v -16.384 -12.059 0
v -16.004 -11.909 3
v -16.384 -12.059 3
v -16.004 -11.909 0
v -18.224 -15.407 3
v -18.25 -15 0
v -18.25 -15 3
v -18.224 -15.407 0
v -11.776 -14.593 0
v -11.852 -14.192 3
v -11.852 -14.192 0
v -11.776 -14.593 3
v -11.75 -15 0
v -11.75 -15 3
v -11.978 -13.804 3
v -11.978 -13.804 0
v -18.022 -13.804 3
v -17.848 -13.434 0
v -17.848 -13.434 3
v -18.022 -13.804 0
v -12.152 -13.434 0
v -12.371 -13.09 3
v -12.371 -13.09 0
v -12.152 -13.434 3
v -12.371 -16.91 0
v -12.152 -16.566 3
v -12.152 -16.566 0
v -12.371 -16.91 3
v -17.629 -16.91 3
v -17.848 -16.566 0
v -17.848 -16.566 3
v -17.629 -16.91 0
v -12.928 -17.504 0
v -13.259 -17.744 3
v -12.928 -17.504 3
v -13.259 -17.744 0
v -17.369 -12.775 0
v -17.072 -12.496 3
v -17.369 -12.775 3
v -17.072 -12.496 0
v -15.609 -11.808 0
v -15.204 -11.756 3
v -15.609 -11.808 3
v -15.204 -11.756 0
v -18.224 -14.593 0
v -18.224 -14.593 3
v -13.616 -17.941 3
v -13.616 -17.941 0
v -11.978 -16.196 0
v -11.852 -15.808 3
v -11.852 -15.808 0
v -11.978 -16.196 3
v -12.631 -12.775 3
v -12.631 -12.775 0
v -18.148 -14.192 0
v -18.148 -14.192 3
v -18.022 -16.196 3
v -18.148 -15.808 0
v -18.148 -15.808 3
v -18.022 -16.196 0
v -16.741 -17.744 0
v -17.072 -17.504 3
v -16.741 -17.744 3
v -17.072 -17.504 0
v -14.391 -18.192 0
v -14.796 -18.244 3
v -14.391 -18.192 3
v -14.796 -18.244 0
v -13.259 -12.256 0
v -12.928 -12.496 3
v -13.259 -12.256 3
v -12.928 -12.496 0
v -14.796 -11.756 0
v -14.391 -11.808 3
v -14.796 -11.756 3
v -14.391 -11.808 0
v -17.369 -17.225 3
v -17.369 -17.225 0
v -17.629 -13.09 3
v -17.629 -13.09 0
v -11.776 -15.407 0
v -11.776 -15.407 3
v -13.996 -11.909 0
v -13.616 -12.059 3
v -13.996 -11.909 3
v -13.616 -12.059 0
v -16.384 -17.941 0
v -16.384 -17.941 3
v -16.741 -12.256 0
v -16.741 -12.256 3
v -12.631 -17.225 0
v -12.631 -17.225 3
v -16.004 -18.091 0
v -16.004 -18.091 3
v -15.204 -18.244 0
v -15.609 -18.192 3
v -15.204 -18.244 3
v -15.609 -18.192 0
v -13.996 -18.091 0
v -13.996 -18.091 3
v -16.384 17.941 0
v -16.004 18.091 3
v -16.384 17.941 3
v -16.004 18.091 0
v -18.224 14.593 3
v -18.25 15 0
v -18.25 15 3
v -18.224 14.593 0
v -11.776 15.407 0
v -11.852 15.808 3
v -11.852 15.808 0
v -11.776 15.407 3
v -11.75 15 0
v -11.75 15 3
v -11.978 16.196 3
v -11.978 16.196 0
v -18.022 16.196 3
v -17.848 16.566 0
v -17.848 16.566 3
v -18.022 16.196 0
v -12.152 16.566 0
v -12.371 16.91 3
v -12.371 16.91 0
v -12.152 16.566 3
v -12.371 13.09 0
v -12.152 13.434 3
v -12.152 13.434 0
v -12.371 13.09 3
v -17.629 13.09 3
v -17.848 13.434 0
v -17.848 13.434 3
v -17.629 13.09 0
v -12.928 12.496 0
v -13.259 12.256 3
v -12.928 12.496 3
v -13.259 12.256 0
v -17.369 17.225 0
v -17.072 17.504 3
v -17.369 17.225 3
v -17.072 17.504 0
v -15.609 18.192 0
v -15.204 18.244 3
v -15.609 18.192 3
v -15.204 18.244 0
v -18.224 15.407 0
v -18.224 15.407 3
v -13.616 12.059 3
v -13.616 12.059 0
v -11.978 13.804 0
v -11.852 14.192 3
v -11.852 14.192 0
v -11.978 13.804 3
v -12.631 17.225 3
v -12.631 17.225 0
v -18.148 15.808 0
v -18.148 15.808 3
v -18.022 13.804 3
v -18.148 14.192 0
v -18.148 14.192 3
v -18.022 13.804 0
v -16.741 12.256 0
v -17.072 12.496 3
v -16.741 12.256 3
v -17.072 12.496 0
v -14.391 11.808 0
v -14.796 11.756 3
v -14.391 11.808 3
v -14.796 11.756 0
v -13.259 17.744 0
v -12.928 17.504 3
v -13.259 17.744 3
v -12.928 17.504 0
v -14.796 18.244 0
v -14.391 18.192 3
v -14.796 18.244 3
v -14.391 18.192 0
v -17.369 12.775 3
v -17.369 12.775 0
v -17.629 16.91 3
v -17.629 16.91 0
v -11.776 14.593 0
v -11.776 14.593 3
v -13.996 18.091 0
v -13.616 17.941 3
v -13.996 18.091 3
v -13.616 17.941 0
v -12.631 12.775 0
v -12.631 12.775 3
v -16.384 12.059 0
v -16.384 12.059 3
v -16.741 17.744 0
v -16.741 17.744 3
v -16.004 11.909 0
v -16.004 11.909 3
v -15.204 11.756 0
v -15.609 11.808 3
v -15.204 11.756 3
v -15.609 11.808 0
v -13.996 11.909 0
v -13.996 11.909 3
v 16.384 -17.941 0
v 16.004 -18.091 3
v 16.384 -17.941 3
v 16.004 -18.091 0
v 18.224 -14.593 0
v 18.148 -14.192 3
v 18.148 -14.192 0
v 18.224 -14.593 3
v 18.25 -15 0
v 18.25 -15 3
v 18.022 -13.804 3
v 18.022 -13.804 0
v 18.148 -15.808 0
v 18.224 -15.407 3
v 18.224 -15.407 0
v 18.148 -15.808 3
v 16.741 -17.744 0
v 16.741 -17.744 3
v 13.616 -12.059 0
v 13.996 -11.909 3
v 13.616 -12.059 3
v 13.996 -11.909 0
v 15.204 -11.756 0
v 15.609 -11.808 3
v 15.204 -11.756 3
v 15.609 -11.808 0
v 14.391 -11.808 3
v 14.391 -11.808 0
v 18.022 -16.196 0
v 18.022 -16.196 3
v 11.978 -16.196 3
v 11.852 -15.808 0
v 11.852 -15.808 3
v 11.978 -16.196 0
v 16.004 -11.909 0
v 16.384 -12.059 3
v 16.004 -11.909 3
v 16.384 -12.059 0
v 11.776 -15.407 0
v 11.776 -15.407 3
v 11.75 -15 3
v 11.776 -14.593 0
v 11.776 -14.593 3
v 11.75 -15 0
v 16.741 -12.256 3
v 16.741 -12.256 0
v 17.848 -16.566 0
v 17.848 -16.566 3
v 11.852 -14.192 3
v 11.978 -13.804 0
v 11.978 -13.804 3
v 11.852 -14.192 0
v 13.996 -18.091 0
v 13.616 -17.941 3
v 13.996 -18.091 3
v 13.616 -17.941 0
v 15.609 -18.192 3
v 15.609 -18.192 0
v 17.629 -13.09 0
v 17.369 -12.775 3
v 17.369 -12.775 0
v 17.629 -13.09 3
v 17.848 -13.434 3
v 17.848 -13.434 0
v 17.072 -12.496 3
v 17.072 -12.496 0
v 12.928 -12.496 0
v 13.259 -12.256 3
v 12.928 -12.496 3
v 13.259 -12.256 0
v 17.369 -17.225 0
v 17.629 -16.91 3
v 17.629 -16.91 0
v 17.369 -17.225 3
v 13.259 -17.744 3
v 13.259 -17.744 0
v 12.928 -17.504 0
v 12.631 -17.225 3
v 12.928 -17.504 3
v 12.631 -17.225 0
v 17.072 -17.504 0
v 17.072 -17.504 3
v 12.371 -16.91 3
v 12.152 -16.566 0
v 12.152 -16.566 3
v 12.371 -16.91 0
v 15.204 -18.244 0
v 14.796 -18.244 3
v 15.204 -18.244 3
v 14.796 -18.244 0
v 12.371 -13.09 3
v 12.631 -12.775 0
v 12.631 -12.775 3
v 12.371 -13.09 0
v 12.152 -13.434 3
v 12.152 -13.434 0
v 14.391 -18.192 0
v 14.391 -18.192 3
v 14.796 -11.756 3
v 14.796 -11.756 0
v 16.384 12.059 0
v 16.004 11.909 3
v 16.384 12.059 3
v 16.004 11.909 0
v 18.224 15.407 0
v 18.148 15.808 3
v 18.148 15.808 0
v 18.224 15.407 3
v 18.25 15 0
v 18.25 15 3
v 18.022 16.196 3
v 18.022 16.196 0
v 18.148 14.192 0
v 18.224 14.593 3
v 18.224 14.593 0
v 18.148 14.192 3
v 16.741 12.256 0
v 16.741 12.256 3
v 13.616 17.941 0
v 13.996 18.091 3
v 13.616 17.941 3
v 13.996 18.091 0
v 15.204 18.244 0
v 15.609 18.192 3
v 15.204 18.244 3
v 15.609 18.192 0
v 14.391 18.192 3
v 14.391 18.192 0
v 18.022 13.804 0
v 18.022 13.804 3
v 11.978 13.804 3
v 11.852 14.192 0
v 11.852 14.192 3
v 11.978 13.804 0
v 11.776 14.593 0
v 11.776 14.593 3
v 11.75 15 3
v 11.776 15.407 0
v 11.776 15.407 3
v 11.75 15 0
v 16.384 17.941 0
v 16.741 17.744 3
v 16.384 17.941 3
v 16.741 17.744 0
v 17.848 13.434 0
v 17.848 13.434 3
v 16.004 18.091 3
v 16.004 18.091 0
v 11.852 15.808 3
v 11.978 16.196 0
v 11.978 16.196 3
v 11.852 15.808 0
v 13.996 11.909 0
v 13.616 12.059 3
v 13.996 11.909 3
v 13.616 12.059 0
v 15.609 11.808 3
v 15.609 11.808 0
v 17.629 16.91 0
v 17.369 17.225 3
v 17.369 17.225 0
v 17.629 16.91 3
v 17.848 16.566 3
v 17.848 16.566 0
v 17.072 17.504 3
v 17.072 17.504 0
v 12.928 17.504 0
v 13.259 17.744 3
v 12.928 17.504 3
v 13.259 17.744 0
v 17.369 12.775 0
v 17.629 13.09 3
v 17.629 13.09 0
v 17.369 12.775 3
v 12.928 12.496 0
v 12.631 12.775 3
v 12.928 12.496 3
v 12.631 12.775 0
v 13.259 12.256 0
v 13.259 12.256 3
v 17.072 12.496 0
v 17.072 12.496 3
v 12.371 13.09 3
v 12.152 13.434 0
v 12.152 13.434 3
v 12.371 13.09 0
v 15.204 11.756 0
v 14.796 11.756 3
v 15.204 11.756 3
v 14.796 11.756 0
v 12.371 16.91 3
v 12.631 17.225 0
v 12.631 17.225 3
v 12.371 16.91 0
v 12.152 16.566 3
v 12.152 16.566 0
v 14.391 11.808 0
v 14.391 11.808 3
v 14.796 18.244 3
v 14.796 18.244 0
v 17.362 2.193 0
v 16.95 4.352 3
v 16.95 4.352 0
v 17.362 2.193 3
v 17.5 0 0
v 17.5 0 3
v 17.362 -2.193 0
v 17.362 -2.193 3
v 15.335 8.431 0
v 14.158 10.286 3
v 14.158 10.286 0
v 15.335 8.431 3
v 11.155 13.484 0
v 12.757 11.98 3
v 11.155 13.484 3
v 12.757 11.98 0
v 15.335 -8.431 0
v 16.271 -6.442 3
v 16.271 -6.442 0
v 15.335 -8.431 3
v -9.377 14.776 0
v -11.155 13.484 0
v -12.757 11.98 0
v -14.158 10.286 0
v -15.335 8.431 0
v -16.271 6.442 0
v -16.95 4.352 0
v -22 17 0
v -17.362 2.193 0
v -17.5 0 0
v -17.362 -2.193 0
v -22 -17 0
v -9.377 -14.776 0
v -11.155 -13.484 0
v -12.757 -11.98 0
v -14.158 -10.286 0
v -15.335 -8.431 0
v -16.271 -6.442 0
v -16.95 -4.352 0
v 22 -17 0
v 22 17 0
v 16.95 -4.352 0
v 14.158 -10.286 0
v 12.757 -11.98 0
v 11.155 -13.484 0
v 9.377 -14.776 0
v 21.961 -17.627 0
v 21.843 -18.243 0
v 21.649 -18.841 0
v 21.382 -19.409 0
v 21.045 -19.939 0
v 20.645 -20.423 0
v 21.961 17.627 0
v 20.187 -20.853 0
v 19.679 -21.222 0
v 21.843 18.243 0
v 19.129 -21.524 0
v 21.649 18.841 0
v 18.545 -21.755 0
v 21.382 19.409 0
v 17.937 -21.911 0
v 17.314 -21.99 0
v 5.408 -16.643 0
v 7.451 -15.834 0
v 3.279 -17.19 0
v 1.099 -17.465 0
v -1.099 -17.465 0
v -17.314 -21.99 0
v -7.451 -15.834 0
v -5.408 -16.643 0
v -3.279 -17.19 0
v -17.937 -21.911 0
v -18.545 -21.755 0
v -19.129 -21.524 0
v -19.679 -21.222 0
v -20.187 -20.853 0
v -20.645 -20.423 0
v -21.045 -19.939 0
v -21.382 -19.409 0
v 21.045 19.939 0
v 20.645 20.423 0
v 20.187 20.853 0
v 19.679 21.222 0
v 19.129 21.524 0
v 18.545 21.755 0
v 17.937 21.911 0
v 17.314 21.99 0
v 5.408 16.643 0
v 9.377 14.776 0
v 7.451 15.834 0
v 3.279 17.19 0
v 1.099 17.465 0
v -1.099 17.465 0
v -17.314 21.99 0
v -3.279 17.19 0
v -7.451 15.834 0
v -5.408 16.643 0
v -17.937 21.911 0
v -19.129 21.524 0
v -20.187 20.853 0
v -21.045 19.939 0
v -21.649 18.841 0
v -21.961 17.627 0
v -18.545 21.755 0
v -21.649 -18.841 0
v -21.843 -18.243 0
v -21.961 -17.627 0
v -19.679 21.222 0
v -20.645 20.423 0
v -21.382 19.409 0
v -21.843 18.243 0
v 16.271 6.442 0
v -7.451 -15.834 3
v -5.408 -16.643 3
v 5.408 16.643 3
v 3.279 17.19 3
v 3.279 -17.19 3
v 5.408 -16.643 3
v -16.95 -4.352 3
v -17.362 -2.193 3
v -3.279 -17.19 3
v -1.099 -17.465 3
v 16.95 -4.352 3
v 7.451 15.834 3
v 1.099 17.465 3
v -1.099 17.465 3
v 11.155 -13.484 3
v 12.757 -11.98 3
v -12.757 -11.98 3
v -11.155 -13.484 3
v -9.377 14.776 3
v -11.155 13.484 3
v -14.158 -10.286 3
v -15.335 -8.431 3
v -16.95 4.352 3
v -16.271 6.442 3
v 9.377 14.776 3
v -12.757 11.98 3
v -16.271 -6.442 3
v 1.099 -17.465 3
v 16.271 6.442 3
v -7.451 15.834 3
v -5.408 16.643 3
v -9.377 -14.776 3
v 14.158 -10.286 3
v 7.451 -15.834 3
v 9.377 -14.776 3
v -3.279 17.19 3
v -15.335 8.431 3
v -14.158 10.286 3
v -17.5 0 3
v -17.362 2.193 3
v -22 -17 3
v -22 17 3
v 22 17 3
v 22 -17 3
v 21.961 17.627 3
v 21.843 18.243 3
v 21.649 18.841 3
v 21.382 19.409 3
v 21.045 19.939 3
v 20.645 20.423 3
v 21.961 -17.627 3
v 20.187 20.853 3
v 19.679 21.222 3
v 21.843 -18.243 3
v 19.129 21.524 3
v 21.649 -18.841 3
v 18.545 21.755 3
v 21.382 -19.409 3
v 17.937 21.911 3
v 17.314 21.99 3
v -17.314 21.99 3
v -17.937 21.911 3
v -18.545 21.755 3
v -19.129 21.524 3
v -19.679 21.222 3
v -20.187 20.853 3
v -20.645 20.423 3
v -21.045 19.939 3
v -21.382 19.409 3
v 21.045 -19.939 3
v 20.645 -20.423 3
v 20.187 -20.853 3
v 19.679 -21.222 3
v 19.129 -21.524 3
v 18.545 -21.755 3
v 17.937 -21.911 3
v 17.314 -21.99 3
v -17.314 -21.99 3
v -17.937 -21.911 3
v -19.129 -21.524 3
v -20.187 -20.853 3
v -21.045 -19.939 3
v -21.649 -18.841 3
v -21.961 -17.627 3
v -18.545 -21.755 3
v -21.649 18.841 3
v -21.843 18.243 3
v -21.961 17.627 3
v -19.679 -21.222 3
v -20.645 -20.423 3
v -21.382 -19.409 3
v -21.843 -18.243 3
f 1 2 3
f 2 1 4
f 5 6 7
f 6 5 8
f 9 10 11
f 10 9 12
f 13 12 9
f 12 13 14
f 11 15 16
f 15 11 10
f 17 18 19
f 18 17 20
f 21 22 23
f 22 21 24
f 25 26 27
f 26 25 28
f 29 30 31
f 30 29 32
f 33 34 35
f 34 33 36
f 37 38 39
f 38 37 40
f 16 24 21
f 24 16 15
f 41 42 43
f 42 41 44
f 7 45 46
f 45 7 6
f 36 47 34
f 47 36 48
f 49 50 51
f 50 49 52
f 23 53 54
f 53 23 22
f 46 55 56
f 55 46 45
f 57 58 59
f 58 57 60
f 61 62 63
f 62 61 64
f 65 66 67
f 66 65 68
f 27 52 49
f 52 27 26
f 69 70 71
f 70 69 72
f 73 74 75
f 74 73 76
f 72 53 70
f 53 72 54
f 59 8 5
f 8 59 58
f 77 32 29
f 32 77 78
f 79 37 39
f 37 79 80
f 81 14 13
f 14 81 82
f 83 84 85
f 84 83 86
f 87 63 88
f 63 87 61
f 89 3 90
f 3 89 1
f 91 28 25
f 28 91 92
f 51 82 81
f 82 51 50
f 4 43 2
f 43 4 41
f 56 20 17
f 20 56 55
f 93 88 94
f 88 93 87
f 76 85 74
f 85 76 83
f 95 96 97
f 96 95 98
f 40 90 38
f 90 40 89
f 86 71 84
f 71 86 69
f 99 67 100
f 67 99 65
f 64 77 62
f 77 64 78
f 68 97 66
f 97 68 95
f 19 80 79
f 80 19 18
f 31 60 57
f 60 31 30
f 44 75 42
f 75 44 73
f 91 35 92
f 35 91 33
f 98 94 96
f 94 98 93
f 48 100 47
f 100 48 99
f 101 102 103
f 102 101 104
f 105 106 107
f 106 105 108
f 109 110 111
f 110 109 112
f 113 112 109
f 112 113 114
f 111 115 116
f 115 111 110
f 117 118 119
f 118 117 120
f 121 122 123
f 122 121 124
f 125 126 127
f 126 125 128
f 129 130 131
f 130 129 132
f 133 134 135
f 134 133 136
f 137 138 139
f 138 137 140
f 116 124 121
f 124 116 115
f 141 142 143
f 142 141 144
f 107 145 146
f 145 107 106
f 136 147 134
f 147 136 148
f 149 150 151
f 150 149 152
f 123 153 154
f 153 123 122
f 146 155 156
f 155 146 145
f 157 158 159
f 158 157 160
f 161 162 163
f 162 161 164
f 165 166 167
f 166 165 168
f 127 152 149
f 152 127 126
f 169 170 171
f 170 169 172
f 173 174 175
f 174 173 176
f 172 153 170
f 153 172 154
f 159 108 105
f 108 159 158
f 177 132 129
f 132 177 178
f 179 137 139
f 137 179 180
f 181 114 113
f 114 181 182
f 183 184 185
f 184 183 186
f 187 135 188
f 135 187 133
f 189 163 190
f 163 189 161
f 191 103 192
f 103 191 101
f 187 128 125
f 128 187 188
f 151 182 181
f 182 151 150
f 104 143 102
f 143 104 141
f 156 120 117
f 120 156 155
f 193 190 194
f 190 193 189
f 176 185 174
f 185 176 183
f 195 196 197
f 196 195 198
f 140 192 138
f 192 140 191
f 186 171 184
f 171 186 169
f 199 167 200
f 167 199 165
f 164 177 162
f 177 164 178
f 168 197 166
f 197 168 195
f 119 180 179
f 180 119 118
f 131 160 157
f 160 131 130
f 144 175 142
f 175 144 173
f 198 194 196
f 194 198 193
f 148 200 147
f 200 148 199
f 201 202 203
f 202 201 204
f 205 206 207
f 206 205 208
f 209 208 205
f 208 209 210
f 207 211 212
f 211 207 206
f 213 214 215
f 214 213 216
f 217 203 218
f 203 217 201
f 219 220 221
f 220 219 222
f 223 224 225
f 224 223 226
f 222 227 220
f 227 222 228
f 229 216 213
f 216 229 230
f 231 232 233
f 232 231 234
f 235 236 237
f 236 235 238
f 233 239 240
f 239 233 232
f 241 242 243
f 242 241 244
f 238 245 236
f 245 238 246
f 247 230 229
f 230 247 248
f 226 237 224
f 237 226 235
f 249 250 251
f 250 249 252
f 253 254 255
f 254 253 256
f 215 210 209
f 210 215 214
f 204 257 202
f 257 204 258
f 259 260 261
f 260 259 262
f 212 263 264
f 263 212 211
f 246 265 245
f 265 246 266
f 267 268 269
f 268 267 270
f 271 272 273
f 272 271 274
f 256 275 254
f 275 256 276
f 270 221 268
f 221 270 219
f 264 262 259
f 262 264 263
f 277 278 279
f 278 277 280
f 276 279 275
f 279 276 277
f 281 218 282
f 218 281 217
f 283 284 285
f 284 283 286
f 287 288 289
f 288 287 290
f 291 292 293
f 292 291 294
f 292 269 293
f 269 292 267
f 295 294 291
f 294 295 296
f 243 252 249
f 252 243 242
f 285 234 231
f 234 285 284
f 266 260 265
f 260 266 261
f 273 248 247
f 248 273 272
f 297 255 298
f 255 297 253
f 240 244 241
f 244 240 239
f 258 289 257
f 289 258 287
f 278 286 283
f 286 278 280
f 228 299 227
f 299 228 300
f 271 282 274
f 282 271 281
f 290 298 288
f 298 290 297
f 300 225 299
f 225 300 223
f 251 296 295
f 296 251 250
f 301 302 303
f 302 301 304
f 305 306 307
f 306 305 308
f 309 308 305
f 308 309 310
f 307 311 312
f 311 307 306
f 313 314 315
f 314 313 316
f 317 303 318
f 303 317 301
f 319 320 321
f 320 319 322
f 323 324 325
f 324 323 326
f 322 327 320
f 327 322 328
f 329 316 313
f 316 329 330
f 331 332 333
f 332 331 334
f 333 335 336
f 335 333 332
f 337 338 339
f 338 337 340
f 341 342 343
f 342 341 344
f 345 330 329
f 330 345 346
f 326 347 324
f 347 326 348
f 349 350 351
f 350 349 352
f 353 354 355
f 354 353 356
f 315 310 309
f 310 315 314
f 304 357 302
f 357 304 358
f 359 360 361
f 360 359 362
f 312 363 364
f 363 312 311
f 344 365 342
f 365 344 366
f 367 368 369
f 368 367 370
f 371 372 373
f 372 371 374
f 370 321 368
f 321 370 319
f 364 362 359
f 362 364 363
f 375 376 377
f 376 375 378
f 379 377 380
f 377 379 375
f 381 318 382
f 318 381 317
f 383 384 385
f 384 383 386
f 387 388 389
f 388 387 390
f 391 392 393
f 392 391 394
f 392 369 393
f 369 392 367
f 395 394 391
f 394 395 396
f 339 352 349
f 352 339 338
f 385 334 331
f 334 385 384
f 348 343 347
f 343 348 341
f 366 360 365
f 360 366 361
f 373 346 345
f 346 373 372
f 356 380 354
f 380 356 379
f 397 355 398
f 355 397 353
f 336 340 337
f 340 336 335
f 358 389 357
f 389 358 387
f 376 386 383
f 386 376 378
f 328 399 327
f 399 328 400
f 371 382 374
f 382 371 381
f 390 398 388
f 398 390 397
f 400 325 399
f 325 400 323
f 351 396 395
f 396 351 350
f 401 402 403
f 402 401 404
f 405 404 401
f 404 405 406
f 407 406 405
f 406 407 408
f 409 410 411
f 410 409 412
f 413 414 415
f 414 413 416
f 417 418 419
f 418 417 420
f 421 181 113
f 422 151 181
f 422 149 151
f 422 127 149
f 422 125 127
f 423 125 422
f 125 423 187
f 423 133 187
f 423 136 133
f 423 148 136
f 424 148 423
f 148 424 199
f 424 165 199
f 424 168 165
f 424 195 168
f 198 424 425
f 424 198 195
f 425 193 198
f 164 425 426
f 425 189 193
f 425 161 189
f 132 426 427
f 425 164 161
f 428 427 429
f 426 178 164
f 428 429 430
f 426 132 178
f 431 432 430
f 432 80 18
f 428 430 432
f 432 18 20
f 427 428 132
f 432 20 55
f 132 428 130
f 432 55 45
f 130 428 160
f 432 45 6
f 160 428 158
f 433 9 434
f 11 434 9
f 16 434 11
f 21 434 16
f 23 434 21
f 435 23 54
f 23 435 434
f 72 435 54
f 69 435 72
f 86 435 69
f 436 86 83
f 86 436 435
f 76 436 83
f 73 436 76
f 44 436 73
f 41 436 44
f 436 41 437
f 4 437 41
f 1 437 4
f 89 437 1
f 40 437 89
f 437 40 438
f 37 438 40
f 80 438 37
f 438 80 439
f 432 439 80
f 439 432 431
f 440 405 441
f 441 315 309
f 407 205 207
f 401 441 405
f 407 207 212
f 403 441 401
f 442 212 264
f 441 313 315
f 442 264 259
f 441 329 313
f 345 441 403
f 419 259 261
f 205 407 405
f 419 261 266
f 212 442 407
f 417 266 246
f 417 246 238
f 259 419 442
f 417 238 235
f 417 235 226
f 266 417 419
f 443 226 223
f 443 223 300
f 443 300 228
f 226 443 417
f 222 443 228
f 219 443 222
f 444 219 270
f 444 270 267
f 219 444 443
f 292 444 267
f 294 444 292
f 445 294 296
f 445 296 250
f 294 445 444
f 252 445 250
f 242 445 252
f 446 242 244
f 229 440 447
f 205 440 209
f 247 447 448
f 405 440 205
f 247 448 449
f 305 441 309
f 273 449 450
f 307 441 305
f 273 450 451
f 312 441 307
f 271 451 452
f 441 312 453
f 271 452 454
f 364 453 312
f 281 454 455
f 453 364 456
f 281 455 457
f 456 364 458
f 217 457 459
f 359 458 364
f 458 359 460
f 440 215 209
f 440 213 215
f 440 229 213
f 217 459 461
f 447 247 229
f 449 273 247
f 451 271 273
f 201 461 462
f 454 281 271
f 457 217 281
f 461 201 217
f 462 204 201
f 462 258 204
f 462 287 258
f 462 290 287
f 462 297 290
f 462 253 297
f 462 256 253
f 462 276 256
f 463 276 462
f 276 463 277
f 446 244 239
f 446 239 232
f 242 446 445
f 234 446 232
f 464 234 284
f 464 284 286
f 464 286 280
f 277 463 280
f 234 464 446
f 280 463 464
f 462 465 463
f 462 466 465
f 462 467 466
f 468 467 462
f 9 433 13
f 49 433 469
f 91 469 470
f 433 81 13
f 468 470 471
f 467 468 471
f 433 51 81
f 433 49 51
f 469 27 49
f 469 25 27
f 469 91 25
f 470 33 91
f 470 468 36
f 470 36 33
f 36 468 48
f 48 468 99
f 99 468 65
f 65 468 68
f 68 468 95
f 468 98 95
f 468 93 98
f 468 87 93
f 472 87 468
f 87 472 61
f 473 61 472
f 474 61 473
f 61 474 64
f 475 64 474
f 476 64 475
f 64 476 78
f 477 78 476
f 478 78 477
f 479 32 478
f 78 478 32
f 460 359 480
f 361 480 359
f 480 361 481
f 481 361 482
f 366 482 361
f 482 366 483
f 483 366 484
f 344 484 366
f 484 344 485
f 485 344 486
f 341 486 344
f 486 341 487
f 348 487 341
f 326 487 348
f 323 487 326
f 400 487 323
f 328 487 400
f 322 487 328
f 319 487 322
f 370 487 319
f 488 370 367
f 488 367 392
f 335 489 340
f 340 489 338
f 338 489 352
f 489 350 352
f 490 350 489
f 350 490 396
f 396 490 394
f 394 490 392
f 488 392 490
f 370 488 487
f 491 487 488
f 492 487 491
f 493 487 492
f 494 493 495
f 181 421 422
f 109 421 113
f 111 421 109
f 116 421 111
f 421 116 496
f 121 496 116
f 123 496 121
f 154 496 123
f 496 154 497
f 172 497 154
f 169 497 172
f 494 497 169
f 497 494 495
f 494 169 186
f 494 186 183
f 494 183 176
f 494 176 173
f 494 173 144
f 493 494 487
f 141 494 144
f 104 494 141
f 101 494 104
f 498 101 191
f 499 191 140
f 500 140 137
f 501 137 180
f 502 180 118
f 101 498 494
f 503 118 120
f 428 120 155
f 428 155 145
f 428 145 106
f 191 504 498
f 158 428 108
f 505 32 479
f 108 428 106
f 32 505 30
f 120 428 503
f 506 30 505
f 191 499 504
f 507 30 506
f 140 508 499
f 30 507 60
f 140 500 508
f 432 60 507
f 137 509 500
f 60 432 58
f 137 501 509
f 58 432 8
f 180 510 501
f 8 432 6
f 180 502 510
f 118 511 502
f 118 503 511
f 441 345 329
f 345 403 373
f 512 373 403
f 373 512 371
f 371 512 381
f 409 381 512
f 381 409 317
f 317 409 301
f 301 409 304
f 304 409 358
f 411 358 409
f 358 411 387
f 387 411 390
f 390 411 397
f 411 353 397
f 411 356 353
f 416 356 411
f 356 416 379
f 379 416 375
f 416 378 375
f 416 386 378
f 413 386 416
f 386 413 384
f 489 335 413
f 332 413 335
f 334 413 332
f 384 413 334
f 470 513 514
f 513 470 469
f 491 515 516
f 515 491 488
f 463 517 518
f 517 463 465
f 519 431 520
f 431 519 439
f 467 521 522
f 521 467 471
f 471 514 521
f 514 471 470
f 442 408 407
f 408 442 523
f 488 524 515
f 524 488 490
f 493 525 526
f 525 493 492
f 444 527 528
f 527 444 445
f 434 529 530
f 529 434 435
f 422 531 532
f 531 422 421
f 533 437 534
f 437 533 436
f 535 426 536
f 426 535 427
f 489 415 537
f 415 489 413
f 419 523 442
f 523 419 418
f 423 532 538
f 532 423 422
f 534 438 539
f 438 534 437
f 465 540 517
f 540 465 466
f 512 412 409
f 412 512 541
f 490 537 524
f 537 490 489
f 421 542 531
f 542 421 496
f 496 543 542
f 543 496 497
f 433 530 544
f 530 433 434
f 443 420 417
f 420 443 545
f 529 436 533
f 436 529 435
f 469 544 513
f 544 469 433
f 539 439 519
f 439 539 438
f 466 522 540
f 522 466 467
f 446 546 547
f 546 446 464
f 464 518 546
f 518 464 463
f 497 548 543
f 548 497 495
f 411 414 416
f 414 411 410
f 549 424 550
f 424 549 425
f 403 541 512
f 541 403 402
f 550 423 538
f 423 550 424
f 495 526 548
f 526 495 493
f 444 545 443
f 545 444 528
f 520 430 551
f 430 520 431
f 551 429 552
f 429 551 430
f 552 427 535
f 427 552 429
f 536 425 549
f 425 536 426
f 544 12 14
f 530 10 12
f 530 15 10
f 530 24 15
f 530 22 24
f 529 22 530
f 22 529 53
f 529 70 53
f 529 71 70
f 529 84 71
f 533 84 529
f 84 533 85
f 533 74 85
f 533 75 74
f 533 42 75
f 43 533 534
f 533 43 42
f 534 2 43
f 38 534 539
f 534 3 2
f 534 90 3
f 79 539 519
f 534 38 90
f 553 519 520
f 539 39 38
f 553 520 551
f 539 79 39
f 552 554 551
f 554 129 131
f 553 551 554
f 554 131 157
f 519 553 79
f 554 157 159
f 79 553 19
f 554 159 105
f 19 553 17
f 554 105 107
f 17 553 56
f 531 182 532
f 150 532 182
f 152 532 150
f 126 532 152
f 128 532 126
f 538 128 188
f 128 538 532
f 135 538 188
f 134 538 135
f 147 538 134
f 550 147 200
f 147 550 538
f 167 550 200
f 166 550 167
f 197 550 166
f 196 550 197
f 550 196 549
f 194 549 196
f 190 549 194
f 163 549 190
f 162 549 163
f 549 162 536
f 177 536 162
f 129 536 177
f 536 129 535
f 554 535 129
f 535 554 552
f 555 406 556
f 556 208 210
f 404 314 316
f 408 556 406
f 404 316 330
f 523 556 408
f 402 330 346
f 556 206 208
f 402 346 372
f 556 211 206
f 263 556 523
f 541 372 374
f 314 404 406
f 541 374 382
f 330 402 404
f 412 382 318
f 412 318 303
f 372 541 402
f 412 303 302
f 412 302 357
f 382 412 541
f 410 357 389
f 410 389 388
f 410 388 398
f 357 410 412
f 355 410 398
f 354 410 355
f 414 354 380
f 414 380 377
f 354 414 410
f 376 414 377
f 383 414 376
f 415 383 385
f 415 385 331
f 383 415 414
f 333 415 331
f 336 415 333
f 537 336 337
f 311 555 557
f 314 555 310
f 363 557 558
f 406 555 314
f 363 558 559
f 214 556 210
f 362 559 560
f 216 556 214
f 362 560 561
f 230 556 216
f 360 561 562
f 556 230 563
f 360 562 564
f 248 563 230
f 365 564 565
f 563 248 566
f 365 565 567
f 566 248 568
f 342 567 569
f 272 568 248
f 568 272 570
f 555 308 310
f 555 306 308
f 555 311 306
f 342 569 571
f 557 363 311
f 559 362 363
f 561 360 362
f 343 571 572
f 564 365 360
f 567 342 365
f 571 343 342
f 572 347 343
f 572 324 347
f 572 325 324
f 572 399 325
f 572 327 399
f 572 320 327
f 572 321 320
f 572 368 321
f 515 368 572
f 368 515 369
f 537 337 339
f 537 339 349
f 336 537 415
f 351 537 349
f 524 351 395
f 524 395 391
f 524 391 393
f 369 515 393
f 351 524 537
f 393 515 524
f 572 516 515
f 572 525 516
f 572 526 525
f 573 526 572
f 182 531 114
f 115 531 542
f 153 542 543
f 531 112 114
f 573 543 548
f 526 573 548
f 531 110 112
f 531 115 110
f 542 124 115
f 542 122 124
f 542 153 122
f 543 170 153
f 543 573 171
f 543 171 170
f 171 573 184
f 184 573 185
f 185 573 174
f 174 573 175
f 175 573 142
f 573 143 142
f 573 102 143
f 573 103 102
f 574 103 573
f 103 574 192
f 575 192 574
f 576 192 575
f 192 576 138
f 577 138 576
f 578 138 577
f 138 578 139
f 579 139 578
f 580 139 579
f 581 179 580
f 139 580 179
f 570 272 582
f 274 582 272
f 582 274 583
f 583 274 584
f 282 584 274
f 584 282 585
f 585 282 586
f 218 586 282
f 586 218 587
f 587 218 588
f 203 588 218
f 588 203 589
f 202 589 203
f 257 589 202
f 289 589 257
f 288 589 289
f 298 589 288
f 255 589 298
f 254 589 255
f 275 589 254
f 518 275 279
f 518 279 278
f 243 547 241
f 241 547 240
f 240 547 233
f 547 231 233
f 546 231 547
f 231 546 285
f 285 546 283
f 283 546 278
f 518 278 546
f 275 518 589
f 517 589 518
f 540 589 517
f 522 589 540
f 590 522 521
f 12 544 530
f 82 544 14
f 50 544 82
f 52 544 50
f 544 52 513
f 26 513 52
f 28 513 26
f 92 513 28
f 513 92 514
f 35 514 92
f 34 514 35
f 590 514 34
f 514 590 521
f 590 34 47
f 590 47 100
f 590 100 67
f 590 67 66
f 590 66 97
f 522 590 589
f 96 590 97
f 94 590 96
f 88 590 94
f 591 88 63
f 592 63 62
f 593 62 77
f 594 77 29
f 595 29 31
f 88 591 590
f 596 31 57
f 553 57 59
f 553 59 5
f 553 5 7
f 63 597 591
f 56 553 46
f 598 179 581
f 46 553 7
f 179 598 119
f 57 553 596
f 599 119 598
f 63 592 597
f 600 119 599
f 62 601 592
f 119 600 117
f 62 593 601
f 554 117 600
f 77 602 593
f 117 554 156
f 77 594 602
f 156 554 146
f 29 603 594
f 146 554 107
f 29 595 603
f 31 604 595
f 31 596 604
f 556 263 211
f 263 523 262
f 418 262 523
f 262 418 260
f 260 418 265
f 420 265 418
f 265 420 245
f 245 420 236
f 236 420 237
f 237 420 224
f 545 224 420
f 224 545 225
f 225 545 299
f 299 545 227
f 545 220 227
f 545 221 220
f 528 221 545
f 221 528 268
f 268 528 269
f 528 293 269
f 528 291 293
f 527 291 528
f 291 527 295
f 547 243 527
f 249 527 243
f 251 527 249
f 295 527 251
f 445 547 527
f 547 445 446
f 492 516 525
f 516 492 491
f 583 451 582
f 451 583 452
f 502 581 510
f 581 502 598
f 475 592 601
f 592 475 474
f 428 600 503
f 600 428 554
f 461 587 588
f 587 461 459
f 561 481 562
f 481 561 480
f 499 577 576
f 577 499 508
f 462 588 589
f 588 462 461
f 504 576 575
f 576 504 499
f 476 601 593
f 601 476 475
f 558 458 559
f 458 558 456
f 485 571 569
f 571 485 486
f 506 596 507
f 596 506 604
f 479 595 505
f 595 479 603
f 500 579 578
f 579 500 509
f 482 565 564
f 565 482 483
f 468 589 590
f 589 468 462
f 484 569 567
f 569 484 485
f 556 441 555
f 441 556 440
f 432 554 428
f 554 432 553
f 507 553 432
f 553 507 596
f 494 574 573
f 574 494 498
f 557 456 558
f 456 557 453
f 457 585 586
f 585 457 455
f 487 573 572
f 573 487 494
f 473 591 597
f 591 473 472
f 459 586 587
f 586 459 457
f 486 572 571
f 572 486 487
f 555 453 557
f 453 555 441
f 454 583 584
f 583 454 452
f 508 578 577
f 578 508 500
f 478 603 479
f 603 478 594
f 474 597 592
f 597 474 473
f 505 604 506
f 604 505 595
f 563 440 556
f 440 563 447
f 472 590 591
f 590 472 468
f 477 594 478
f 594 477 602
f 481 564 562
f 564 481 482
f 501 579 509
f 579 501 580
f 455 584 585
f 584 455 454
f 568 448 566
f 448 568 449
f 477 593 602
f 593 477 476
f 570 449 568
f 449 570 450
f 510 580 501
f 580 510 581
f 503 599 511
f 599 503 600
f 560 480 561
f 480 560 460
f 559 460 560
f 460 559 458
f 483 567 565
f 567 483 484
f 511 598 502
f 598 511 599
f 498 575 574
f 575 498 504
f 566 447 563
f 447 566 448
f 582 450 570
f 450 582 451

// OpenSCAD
$fn = 50;

difference() {
	union() {
		hull() {
			translate(v = [-17.0, 17.0, 0]) {
				cylinder(h = 3, r = 5);
			}
			translate(v = [17.0, 17.0, 0]) {
				cylinder(h = 3, r = 5);
			}
			translate(v = [-17.0, -17.0, 0]) {
				cylinder(h = 3, r = 5);
			}
			translate(v = [17.0, -17.0, 0]) {
				cylinder(h = 3, r = 5);
			}
		}
	}
	union() {
		translate(v = [-15.0, -15.0, -100.0]) {
			cylinder(h = 200, r = 3.25);
		}
		translate(v = [-15.0, 15.0, -100.0]) {
			cylinder(h = 200, r = 3.25);
		}
		translate(v = [15.0, -15.0, -100.0]) {
			cylinder(h = 200, r = 3.25);
		}
		translate(v = [15.0, 15.0, -100.0]) {
			cylinder(h = 200, r = 3.25);
		}
		translate(v = [-15.0, -15.0, -100.0]) {
			cylinder(h = 200, r = 1.8);
		}
		translate(v = [-15.0, 15.0, -100.0]) {
			cylinder(h = 200, r = 1.8);
		}
		translate(v = [15.0, -15.0, -100.0]) {
			cylinder(h = 200, r = 1.8);
		}
		translate(v = [15.0, 15.0, -100.0]) {
			cylinder(h = 200, r = 1.8);
		}
		cylinder(h = 3, r = 17.5);
	}
}
